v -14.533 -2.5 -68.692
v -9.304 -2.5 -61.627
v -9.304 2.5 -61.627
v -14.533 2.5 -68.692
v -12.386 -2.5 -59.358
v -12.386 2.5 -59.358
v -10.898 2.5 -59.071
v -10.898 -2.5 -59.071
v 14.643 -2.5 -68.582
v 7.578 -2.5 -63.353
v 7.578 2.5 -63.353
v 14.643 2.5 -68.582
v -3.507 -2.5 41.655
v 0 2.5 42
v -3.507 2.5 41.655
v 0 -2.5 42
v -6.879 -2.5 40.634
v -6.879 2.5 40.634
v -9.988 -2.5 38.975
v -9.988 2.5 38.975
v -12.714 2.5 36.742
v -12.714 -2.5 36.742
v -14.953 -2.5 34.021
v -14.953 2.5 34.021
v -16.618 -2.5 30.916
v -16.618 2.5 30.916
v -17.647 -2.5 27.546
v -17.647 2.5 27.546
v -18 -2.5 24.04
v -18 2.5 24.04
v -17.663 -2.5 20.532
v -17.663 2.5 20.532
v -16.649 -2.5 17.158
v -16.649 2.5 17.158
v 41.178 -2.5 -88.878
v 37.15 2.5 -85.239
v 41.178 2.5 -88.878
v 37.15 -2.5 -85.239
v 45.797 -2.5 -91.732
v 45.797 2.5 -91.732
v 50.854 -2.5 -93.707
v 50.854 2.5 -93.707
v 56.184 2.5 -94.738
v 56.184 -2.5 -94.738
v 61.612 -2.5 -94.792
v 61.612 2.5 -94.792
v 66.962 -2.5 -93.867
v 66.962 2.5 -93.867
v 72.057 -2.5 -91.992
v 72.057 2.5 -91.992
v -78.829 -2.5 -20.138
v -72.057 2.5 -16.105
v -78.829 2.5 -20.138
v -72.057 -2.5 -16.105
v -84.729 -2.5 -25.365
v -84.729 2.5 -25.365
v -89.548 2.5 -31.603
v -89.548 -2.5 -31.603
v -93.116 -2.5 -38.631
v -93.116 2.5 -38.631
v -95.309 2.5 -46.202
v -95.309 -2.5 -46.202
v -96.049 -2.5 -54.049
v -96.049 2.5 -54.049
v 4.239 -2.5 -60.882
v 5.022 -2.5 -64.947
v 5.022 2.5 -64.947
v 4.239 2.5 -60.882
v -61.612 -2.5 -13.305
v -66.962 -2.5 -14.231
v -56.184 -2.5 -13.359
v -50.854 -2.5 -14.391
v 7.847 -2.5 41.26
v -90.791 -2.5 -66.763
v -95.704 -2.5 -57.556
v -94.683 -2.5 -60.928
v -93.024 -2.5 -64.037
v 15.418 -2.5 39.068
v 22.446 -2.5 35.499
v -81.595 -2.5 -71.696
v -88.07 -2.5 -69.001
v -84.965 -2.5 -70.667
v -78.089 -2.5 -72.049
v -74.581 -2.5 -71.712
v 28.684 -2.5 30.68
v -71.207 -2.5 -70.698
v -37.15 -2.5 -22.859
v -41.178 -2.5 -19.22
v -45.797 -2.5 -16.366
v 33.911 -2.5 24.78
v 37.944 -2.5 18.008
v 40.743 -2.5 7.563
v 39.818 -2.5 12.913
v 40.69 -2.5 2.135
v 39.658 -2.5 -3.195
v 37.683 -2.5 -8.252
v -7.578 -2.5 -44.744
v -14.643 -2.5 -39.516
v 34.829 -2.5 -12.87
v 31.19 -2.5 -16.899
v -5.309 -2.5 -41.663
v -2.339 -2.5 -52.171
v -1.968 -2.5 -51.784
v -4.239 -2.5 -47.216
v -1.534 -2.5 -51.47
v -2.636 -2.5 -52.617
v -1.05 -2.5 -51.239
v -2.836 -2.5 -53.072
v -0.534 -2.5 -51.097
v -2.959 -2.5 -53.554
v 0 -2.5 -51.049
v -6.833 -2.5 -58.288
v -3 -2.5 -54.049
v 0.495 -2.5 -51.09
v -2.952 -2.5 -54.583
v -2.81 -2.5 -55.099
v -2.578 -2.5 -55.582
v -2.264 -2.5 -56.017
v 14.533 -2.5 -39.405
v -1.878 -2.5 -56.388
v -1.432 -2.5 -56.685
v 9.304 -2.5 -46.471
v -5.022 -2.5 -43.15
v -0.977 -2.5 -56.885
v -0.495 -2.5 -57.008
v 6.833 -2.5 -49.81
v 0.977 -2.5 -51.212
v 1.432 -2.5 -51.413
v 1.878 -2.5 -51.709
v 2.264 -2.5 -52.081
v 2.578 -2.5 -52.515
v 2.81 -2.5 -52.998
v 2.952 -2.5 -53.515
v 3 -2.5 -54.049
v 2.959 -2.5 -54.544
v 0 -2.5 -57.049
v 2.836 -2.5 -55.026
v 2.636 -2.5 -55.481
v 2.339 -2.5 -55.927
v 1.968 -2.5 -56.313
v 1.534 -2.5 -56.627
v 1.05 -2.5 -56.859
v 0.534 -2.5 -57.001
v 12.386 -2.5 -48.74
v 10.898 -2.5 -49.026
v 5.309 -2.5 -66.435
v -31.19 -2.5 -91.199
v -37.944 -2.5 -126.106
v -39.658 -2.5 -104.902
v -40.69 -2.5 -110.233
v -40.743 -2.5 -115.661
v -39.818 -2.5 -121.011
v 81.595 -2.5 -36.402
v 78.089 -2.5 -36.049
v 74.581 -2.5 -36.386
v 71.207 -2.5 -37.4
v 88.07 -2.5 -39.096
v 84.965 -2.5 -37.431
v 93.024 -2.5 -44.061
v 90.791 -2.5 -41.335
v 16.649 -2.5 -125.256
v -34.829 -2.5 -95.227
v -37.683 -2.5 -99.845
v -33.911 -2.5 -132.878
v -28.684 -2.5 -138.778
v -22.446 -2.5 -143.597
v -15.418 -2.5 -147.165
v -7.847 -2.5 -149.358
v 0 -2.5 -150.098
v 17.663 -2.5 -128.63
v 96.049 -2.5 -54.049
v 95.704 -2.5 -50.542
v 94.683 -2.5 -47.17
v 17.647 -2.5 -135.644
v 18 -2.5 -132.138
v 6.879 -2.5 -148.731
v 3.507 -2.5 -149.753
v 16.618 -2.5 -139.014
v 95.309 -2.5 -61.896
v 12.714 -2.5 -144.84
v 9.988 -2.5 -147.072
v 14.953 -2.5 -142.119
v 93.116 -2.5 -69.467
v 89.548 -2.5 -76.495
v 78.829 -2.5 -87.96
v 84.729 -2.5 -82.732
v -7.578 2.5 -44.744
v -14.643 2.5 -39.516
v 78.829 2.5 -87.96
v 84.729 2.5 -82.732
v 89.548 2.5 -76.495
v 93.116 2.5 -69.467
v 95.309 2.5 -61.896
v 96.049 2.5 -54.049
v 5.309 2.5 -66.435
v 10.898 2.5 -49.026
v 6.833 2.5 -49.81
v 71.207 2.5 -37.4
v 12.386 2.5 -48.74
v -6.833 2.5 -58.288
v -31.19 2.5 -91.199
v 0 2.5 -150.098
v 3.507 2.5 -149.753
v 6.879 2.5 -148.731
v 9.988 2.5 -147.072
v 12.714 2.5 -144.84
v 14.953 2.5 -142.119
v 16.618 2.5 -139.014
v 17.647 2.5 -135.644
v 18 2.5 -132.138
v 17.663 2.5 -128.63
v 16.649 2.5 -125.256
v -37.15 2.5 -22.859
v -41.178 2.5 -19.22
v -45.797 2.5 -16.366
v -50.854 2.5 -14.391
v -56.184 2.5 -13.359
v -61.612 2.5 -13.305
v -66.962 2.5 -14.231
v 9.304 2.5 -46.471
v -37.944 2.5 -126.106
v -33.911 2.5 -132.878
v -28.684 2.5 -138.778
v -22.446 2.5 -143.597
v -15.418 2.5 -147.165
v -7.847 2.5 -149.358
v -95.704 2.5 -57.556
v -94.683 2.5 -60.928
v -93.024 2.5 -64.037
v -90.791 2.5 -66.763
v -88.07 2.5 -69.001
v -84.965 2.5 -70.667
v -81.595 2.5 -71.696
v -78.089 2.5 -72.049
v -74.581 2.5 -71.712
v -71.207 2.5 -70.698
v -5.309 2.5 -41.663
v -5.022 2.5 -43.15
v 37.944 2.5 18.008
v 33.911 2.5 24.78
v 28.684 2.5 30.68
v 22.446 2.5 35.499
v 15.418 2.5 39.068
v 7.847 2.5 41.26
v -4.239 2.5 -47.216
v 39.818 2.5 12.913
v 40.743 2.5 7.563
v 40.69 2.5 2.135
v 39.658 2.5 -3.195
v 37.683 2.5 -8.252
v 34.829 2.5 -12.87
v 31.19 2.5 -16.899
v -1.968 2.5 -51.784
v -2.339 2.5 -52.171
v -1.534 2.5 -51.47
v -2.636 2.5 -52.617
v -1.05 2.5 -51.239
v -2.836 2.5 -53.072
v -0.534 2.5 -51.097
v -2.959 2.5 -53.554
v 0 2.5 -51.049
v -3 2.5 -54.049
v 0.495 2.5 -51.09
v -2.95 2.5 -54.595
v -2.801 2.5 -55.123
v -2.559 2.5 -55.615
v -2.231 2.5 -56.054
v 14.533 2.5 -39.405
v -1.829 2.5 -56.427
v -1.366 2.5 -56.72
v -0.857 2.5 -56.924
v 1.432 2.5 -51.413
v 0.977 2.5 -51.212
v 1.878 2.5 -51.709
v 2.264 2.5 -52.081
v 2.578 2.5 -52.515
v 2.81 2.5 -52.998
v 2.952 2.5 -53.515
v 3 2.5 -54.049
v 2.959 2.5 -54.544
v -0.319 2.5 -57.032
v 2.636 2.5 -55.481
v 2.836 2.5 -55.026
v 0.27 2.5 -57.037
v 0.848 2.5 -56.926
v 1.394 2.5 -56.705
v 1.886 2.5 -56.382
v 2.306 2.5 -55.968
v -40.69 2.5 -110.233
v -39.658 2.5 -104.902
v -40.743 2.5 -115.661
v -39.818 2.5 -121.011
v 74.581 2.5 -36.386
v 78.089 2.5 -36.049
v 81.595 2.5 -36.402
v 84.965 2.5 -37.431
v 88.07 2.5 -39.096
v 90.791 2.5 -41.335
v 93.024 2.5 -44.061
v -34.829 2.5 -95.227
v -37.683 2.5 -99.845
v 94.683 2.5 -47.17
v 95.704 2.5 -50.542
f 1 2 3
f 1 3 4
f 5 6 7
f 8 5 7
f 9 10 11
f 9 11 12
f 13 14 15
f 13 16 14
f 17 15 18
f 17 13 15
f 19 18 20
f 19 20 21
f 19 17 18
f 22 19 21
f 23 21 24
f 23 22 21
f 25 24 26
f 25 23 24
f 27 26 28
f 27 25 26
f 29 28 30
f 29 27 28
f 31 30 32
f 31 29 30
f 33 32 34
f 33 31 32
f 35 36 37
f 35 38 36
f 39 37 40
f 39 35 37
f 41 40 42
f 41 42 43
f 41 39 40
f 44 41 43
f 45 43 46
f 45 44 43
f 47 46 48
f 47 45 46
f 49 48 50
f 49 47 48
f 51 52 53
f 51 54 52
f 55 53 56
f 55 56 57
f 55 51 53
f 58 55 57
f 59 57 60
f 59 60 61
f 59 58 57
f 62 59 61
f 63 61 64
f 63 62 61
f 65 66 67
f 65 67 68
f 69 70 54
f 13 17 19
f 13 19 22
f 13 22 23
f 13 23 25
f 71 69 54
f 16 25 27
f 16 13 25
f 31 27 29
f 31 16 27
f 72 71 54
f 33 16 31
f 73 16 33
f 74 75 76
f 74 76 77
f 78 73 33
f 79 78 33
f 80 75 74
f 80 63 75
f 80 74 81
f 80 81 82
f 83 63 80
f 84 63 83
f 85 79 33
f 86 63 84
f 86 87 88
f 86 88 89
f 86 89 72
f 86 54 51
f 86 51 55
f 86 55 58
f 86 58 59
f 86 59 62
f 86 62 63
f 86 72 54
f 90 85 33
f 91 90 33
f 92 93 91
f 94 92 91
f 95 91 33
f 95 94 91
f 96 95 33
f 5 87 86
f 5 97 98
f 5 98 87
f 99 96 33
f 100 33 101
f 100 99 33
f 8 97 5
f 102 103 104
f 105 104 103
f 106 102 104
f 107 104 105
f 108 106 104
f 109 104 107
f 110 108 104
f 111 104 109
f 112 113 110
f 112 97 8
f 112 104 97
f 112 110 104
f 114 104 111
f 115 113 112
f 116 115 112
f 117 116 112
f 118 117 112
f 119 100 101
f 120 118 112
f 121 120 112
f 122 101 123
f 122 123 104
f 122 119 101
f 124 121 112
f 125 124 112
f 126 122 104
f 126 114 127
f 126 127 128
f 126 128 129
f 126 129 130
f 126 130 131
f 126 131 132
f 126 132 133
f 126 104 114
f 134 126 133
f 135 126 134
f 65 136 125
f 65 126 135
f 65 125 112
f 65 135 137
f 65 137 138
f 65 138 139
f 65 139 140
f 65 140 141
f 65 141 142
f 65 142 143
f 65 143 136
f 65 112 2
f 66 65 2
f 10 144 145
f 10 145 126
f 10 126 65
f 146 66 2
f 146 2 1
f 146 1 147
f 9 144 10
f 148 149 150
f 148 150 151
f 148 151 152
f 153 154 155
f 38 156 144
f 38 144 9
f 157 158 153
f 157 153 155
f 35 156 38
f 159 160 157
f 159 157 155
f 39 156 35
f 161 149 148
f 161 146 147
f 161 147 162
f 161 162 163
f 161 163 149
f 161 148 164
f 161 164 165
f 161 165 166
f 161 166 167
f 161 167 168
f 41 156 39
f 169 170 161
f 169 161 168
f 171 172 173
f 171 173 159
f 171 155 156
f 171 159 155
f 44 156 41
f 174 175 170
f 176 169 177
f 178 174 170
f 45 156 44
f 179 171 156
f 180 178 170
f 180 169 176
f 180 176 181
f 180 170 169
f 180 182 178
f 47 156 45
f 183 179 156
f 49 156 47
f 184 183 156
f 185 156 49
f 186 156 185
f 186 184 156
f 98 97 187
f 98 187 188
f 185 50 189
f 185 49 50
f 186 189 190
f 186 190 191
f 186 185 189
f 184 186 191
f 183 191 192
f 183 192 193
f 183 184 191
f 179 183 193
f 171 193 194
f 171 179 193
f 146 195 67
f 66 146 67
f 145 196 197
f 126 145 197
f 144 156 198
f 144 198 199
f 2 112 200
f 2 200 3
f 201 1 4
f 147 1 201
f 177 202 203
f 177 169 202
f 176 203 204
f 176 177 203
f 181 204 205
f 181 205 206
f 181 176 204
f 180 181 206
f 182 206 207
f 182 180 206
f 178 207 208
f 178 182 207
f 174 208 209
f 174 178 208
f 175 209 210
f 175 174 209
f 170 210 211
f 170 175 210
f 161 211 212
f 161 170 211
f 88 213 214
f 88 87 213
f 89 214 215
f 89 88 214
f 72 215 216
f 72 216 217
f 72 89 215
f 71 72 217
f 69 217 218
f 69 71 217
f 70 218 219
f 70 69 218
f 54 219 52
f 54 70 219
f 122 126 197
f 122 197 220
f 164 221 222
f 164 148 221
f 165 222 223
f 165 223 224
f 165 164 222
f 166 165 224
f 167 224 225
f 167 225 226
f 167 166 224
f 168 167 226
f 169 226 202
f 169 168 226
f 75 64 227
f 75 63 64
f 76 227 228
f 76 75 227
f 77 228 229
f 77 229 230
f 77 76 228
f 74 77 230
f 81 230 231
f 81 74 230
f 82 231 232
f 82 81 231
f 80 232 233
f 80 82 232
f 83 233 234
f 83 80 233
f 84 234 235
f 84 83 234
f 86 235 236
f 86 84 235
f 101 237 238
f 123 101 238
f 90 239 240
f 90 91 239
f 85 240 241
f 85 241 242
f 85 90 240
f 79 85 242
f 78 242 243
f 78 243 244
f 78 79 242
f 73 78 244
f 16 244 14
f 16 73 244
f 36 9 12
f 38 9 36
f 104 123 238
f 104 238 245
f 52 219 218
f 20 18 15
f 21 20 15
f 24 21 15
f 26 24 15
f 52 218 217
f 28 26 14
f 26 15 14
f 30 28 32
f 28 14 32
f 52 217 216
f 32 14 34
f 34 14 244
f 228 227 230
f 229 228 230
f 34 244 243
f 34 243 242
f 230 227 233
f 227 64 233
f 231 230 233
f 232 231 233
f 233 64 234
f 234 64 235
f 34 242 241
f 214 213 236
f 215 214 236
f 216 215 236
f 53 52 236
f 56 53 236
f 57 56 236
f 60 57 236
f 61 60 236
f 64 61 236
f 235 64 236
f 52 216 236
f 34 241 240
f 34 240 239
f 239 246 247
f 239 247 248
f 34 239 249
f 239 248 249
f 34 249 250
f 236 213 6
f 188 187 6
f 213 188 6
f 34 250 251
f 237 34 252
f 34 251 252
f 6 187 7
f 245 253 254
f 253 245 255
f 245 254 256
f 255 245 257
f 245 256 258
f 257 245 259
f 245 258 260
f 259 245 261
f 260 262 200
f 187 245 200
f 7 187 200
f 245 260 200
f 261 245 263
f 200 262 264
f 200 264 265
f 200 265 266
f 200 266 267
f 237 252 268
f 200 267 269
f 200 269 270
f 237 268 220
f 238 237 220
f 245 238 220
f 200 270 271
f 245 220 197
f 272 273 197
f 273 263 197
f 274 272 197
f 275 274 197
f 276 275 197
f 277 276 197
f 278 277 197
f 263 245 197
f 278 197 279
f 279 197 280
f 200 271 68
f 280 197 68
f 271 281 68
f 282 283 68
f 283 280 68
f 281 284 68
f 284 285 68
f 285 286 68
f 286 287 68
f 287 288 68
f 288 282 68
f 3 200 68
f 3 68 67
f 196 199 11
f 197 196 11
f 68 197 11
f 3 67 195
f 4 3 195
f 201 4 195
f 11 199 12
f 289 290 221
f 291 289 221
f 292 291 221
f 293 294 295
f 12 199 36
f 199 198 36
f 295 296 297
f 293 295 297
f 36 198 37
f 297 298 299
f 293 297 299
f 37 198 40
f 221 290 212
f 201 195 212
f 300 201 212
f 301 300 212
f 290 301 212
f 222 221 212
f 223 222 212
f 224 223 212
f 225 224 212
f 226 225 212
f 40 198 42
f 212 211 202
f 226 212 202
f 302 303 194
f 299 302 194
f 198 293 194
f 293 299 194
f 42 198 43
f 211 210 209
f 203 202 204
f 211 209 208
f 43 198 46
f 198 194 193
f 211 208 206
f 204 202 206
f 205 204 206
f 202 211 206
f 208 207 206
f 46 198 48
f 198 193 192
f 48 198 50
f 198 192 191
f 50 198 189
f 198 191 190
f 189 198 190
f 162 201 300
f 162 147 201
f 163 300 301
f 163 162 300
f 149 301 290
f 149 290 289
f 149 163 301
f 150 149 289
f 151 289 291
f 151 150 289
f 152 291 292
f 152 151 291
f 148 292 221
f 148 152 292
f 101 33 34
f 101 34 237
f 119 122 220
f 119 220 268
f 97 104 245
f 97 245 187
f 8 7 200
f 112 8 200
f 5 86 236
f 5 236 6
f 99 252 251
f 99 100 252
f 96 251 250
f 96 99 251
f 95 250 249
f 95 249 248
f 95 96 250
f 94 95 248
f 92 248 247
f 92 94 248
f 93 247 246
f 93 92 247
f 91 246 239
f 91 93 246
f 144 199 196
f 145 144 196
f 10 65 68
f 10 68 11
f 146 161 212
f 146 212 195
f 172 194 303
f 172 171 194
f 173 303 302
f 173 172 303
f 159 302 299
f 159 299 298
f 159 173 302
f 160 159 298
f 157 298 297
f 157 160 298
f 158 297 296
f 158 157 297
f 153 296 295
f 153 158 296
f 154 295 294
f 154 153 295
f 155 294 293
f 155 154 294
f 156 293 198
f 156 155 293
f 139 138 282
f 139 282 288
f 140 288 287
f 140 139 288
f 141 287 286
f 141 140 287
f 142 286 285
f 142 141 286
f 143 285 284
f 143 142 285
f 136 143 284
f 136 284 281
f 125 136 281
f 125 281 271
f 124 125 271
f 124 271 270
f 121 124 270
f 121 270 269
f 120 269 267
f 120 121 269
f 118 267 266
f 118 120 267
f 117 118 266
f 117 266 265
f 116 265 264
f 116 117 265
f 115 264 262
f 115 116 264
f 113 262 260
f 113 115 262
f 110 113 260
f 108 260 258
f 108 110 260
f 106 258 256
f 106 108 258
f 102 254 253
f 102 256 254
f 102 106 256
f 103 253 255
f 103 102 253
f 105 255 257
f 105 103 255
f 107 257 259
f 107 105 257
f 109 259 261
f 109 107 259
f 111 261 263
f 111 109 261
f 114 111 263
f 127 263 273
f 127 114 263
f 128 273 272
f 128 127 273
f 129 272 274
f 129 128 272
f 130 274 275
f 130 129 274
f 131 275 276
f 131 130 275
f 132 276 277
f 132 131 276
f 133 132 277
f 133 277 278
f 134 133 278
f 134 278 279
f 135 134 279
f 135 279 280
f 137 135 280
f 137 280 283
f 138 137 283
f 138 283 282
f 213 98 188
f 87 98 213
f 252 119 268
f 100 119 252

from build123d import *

# Parameters (mm, degrees)
F1_DEPTH = 2.5
F2_COUNT = 4


with BuildPart() as f1:
    # F0 (on Front) → F1 (new body, symmetric)
    with BuildSketch(Plane.XZ):
        with BuildLine():
            ThreePointArc((18, 24), (17.0470416958, 29.7791322377), (14.2890700643, 34.946345358))
            ThreePointArc((14.2890700643, 34.946345358), (-4.1125794445, 31.1526624853), (-16.6488897576, 17.157889957))
            ThreePointArc((-16.6488897576, 17.157889957), (3.4871180339, 6.3410077349), (18, 24))
        make_face()
        with BuildLine():
            ThreePointArc((14.2890700643, 34.946345358), (7.967615209, 40.1405423664), (4.77e-08, 42))
            ThreePointArc((4.77e-08, 42), (-14.9525579748, 34.0210283908), (-16.6488897576, 17.157889957))
            ThreePointArc((-16.6488897576, 17.157889957), (-4.1125794445, 31.1526624853), (14.2890700643, 34.946345358))
        make_face()
        with BuildLine():
            ThreePointArc((40.8410037042, 5.1451568183), (40.1076678925, 11.7377562518), (37.9435125515, 18.0080497349))
            ThreePointArc((37.9435125515, 18.0080497349), (28.3069956895, 29.5365307848), (14.2890700643, 34.946345358))
            ThreePointArc((14.2890700643, 34.946345358), (17.0470416958, 29.7791322377), (18, 24))
            ThreePointArc((18, 24), (3.4871180339, 6.3410077349), (-16.6488897576, 17.157889957))
            Line((-16.6488897576, 17.157889957), (-10.2130597935, -16.2260015554))
            ThreePointArc((-10.2130597935, -16.2260015554), (10.3536707871, -24.8508846976), (31.1897226642, -16.8986549366))
            ThreePointArc((31.1897226642, -16.8986549366), (38.3224662635, -6.8868511438), (40.8410037042, 5.1451568183))
        make_face()
        with BuildLine():
            ThreePointArc((-5.3092368295, -41.6630772302), (4.7480675162, -41.730754305), (14.5331010068, -39.4054434707))
            Line((14.5331010068, -39.4054434707), (31.1897226642, -16.8986549366))
            ThreePointArc((31.1897226642, -16.8986549366), (10.3536707871, -24.8508846976), (-10.2130597935, -16.2260015554))
            Line((-10.2130597935, -16.2260015554), (-5.3092368295, -41.6630772302))
        make_face()
        with BuildLine():
            Line((9.3043480393, -46.4706479136), (14.5331010068, -39.4054434707))
            ThreePointArc((14.5331010068, -39.4054434707), (4.7480675162, -41.730754305), (-5.3092368295, -41.6630772302))
            Line((-5.3092368295, -41.6630772302), (-5.0224929571, -43.1504730102))
            ThreePointArc((-5.0224929571, -43.1504730102), (2.7091439762, -42.3586575491), (9.3043480393, -46.4706479136))
        make_face()
        with BuildLine():
            Line((2.6361842657, -55.4808154644), (9.3043480393, -46.4706479136))
            ThreePointArc((9.3043480393, -46.4706479136), (2.7091439762, -42.3586575491), (-5.0224929571, -43.1504730102))
            Line((-5.0224929571, -43.1504730102), (-2.982985598, -53.729791108))
            ThreePointArc((-2.982985598, -53.729791108), (0.1597548214, -51.0531040274), (3, -54.0488474071))
            ThreePointArc((3, -54.0488474071), (2.9076238406, -54.7875784822), (2.6361842657, -55.4808154644))
        make_face()
        with BuildLine():
            ThreePointArc((14.2890700643, 34.946345358), (28.3069956895, 29.5365307848), (37.9435125515, 18.0080497349))
            ThreePointArc((37.9435125515, 18.0080497349), (22.4461791063, 35.4988597497), (4.77e-08, 42))
            ThreePointArc((4.77e-08, 42), (7.967615209, 40.1405423664), (14.2890700643, 34.946345358))
        make_face()
    extrude(amount=F1_DEPTH, both=True)

    # F2: F1 ×4 about axis
    f2_axis = Axis((0, 0, -54.0488474071), (0, -1, 0))


with BuildPart() as f1_1:
    add(f1.part)
    for i in range(1, F2_COUNT):
        add(f1.part.rotate(f2_axis, i * 360 / F2_COUNT))


solid = f1_1.part
